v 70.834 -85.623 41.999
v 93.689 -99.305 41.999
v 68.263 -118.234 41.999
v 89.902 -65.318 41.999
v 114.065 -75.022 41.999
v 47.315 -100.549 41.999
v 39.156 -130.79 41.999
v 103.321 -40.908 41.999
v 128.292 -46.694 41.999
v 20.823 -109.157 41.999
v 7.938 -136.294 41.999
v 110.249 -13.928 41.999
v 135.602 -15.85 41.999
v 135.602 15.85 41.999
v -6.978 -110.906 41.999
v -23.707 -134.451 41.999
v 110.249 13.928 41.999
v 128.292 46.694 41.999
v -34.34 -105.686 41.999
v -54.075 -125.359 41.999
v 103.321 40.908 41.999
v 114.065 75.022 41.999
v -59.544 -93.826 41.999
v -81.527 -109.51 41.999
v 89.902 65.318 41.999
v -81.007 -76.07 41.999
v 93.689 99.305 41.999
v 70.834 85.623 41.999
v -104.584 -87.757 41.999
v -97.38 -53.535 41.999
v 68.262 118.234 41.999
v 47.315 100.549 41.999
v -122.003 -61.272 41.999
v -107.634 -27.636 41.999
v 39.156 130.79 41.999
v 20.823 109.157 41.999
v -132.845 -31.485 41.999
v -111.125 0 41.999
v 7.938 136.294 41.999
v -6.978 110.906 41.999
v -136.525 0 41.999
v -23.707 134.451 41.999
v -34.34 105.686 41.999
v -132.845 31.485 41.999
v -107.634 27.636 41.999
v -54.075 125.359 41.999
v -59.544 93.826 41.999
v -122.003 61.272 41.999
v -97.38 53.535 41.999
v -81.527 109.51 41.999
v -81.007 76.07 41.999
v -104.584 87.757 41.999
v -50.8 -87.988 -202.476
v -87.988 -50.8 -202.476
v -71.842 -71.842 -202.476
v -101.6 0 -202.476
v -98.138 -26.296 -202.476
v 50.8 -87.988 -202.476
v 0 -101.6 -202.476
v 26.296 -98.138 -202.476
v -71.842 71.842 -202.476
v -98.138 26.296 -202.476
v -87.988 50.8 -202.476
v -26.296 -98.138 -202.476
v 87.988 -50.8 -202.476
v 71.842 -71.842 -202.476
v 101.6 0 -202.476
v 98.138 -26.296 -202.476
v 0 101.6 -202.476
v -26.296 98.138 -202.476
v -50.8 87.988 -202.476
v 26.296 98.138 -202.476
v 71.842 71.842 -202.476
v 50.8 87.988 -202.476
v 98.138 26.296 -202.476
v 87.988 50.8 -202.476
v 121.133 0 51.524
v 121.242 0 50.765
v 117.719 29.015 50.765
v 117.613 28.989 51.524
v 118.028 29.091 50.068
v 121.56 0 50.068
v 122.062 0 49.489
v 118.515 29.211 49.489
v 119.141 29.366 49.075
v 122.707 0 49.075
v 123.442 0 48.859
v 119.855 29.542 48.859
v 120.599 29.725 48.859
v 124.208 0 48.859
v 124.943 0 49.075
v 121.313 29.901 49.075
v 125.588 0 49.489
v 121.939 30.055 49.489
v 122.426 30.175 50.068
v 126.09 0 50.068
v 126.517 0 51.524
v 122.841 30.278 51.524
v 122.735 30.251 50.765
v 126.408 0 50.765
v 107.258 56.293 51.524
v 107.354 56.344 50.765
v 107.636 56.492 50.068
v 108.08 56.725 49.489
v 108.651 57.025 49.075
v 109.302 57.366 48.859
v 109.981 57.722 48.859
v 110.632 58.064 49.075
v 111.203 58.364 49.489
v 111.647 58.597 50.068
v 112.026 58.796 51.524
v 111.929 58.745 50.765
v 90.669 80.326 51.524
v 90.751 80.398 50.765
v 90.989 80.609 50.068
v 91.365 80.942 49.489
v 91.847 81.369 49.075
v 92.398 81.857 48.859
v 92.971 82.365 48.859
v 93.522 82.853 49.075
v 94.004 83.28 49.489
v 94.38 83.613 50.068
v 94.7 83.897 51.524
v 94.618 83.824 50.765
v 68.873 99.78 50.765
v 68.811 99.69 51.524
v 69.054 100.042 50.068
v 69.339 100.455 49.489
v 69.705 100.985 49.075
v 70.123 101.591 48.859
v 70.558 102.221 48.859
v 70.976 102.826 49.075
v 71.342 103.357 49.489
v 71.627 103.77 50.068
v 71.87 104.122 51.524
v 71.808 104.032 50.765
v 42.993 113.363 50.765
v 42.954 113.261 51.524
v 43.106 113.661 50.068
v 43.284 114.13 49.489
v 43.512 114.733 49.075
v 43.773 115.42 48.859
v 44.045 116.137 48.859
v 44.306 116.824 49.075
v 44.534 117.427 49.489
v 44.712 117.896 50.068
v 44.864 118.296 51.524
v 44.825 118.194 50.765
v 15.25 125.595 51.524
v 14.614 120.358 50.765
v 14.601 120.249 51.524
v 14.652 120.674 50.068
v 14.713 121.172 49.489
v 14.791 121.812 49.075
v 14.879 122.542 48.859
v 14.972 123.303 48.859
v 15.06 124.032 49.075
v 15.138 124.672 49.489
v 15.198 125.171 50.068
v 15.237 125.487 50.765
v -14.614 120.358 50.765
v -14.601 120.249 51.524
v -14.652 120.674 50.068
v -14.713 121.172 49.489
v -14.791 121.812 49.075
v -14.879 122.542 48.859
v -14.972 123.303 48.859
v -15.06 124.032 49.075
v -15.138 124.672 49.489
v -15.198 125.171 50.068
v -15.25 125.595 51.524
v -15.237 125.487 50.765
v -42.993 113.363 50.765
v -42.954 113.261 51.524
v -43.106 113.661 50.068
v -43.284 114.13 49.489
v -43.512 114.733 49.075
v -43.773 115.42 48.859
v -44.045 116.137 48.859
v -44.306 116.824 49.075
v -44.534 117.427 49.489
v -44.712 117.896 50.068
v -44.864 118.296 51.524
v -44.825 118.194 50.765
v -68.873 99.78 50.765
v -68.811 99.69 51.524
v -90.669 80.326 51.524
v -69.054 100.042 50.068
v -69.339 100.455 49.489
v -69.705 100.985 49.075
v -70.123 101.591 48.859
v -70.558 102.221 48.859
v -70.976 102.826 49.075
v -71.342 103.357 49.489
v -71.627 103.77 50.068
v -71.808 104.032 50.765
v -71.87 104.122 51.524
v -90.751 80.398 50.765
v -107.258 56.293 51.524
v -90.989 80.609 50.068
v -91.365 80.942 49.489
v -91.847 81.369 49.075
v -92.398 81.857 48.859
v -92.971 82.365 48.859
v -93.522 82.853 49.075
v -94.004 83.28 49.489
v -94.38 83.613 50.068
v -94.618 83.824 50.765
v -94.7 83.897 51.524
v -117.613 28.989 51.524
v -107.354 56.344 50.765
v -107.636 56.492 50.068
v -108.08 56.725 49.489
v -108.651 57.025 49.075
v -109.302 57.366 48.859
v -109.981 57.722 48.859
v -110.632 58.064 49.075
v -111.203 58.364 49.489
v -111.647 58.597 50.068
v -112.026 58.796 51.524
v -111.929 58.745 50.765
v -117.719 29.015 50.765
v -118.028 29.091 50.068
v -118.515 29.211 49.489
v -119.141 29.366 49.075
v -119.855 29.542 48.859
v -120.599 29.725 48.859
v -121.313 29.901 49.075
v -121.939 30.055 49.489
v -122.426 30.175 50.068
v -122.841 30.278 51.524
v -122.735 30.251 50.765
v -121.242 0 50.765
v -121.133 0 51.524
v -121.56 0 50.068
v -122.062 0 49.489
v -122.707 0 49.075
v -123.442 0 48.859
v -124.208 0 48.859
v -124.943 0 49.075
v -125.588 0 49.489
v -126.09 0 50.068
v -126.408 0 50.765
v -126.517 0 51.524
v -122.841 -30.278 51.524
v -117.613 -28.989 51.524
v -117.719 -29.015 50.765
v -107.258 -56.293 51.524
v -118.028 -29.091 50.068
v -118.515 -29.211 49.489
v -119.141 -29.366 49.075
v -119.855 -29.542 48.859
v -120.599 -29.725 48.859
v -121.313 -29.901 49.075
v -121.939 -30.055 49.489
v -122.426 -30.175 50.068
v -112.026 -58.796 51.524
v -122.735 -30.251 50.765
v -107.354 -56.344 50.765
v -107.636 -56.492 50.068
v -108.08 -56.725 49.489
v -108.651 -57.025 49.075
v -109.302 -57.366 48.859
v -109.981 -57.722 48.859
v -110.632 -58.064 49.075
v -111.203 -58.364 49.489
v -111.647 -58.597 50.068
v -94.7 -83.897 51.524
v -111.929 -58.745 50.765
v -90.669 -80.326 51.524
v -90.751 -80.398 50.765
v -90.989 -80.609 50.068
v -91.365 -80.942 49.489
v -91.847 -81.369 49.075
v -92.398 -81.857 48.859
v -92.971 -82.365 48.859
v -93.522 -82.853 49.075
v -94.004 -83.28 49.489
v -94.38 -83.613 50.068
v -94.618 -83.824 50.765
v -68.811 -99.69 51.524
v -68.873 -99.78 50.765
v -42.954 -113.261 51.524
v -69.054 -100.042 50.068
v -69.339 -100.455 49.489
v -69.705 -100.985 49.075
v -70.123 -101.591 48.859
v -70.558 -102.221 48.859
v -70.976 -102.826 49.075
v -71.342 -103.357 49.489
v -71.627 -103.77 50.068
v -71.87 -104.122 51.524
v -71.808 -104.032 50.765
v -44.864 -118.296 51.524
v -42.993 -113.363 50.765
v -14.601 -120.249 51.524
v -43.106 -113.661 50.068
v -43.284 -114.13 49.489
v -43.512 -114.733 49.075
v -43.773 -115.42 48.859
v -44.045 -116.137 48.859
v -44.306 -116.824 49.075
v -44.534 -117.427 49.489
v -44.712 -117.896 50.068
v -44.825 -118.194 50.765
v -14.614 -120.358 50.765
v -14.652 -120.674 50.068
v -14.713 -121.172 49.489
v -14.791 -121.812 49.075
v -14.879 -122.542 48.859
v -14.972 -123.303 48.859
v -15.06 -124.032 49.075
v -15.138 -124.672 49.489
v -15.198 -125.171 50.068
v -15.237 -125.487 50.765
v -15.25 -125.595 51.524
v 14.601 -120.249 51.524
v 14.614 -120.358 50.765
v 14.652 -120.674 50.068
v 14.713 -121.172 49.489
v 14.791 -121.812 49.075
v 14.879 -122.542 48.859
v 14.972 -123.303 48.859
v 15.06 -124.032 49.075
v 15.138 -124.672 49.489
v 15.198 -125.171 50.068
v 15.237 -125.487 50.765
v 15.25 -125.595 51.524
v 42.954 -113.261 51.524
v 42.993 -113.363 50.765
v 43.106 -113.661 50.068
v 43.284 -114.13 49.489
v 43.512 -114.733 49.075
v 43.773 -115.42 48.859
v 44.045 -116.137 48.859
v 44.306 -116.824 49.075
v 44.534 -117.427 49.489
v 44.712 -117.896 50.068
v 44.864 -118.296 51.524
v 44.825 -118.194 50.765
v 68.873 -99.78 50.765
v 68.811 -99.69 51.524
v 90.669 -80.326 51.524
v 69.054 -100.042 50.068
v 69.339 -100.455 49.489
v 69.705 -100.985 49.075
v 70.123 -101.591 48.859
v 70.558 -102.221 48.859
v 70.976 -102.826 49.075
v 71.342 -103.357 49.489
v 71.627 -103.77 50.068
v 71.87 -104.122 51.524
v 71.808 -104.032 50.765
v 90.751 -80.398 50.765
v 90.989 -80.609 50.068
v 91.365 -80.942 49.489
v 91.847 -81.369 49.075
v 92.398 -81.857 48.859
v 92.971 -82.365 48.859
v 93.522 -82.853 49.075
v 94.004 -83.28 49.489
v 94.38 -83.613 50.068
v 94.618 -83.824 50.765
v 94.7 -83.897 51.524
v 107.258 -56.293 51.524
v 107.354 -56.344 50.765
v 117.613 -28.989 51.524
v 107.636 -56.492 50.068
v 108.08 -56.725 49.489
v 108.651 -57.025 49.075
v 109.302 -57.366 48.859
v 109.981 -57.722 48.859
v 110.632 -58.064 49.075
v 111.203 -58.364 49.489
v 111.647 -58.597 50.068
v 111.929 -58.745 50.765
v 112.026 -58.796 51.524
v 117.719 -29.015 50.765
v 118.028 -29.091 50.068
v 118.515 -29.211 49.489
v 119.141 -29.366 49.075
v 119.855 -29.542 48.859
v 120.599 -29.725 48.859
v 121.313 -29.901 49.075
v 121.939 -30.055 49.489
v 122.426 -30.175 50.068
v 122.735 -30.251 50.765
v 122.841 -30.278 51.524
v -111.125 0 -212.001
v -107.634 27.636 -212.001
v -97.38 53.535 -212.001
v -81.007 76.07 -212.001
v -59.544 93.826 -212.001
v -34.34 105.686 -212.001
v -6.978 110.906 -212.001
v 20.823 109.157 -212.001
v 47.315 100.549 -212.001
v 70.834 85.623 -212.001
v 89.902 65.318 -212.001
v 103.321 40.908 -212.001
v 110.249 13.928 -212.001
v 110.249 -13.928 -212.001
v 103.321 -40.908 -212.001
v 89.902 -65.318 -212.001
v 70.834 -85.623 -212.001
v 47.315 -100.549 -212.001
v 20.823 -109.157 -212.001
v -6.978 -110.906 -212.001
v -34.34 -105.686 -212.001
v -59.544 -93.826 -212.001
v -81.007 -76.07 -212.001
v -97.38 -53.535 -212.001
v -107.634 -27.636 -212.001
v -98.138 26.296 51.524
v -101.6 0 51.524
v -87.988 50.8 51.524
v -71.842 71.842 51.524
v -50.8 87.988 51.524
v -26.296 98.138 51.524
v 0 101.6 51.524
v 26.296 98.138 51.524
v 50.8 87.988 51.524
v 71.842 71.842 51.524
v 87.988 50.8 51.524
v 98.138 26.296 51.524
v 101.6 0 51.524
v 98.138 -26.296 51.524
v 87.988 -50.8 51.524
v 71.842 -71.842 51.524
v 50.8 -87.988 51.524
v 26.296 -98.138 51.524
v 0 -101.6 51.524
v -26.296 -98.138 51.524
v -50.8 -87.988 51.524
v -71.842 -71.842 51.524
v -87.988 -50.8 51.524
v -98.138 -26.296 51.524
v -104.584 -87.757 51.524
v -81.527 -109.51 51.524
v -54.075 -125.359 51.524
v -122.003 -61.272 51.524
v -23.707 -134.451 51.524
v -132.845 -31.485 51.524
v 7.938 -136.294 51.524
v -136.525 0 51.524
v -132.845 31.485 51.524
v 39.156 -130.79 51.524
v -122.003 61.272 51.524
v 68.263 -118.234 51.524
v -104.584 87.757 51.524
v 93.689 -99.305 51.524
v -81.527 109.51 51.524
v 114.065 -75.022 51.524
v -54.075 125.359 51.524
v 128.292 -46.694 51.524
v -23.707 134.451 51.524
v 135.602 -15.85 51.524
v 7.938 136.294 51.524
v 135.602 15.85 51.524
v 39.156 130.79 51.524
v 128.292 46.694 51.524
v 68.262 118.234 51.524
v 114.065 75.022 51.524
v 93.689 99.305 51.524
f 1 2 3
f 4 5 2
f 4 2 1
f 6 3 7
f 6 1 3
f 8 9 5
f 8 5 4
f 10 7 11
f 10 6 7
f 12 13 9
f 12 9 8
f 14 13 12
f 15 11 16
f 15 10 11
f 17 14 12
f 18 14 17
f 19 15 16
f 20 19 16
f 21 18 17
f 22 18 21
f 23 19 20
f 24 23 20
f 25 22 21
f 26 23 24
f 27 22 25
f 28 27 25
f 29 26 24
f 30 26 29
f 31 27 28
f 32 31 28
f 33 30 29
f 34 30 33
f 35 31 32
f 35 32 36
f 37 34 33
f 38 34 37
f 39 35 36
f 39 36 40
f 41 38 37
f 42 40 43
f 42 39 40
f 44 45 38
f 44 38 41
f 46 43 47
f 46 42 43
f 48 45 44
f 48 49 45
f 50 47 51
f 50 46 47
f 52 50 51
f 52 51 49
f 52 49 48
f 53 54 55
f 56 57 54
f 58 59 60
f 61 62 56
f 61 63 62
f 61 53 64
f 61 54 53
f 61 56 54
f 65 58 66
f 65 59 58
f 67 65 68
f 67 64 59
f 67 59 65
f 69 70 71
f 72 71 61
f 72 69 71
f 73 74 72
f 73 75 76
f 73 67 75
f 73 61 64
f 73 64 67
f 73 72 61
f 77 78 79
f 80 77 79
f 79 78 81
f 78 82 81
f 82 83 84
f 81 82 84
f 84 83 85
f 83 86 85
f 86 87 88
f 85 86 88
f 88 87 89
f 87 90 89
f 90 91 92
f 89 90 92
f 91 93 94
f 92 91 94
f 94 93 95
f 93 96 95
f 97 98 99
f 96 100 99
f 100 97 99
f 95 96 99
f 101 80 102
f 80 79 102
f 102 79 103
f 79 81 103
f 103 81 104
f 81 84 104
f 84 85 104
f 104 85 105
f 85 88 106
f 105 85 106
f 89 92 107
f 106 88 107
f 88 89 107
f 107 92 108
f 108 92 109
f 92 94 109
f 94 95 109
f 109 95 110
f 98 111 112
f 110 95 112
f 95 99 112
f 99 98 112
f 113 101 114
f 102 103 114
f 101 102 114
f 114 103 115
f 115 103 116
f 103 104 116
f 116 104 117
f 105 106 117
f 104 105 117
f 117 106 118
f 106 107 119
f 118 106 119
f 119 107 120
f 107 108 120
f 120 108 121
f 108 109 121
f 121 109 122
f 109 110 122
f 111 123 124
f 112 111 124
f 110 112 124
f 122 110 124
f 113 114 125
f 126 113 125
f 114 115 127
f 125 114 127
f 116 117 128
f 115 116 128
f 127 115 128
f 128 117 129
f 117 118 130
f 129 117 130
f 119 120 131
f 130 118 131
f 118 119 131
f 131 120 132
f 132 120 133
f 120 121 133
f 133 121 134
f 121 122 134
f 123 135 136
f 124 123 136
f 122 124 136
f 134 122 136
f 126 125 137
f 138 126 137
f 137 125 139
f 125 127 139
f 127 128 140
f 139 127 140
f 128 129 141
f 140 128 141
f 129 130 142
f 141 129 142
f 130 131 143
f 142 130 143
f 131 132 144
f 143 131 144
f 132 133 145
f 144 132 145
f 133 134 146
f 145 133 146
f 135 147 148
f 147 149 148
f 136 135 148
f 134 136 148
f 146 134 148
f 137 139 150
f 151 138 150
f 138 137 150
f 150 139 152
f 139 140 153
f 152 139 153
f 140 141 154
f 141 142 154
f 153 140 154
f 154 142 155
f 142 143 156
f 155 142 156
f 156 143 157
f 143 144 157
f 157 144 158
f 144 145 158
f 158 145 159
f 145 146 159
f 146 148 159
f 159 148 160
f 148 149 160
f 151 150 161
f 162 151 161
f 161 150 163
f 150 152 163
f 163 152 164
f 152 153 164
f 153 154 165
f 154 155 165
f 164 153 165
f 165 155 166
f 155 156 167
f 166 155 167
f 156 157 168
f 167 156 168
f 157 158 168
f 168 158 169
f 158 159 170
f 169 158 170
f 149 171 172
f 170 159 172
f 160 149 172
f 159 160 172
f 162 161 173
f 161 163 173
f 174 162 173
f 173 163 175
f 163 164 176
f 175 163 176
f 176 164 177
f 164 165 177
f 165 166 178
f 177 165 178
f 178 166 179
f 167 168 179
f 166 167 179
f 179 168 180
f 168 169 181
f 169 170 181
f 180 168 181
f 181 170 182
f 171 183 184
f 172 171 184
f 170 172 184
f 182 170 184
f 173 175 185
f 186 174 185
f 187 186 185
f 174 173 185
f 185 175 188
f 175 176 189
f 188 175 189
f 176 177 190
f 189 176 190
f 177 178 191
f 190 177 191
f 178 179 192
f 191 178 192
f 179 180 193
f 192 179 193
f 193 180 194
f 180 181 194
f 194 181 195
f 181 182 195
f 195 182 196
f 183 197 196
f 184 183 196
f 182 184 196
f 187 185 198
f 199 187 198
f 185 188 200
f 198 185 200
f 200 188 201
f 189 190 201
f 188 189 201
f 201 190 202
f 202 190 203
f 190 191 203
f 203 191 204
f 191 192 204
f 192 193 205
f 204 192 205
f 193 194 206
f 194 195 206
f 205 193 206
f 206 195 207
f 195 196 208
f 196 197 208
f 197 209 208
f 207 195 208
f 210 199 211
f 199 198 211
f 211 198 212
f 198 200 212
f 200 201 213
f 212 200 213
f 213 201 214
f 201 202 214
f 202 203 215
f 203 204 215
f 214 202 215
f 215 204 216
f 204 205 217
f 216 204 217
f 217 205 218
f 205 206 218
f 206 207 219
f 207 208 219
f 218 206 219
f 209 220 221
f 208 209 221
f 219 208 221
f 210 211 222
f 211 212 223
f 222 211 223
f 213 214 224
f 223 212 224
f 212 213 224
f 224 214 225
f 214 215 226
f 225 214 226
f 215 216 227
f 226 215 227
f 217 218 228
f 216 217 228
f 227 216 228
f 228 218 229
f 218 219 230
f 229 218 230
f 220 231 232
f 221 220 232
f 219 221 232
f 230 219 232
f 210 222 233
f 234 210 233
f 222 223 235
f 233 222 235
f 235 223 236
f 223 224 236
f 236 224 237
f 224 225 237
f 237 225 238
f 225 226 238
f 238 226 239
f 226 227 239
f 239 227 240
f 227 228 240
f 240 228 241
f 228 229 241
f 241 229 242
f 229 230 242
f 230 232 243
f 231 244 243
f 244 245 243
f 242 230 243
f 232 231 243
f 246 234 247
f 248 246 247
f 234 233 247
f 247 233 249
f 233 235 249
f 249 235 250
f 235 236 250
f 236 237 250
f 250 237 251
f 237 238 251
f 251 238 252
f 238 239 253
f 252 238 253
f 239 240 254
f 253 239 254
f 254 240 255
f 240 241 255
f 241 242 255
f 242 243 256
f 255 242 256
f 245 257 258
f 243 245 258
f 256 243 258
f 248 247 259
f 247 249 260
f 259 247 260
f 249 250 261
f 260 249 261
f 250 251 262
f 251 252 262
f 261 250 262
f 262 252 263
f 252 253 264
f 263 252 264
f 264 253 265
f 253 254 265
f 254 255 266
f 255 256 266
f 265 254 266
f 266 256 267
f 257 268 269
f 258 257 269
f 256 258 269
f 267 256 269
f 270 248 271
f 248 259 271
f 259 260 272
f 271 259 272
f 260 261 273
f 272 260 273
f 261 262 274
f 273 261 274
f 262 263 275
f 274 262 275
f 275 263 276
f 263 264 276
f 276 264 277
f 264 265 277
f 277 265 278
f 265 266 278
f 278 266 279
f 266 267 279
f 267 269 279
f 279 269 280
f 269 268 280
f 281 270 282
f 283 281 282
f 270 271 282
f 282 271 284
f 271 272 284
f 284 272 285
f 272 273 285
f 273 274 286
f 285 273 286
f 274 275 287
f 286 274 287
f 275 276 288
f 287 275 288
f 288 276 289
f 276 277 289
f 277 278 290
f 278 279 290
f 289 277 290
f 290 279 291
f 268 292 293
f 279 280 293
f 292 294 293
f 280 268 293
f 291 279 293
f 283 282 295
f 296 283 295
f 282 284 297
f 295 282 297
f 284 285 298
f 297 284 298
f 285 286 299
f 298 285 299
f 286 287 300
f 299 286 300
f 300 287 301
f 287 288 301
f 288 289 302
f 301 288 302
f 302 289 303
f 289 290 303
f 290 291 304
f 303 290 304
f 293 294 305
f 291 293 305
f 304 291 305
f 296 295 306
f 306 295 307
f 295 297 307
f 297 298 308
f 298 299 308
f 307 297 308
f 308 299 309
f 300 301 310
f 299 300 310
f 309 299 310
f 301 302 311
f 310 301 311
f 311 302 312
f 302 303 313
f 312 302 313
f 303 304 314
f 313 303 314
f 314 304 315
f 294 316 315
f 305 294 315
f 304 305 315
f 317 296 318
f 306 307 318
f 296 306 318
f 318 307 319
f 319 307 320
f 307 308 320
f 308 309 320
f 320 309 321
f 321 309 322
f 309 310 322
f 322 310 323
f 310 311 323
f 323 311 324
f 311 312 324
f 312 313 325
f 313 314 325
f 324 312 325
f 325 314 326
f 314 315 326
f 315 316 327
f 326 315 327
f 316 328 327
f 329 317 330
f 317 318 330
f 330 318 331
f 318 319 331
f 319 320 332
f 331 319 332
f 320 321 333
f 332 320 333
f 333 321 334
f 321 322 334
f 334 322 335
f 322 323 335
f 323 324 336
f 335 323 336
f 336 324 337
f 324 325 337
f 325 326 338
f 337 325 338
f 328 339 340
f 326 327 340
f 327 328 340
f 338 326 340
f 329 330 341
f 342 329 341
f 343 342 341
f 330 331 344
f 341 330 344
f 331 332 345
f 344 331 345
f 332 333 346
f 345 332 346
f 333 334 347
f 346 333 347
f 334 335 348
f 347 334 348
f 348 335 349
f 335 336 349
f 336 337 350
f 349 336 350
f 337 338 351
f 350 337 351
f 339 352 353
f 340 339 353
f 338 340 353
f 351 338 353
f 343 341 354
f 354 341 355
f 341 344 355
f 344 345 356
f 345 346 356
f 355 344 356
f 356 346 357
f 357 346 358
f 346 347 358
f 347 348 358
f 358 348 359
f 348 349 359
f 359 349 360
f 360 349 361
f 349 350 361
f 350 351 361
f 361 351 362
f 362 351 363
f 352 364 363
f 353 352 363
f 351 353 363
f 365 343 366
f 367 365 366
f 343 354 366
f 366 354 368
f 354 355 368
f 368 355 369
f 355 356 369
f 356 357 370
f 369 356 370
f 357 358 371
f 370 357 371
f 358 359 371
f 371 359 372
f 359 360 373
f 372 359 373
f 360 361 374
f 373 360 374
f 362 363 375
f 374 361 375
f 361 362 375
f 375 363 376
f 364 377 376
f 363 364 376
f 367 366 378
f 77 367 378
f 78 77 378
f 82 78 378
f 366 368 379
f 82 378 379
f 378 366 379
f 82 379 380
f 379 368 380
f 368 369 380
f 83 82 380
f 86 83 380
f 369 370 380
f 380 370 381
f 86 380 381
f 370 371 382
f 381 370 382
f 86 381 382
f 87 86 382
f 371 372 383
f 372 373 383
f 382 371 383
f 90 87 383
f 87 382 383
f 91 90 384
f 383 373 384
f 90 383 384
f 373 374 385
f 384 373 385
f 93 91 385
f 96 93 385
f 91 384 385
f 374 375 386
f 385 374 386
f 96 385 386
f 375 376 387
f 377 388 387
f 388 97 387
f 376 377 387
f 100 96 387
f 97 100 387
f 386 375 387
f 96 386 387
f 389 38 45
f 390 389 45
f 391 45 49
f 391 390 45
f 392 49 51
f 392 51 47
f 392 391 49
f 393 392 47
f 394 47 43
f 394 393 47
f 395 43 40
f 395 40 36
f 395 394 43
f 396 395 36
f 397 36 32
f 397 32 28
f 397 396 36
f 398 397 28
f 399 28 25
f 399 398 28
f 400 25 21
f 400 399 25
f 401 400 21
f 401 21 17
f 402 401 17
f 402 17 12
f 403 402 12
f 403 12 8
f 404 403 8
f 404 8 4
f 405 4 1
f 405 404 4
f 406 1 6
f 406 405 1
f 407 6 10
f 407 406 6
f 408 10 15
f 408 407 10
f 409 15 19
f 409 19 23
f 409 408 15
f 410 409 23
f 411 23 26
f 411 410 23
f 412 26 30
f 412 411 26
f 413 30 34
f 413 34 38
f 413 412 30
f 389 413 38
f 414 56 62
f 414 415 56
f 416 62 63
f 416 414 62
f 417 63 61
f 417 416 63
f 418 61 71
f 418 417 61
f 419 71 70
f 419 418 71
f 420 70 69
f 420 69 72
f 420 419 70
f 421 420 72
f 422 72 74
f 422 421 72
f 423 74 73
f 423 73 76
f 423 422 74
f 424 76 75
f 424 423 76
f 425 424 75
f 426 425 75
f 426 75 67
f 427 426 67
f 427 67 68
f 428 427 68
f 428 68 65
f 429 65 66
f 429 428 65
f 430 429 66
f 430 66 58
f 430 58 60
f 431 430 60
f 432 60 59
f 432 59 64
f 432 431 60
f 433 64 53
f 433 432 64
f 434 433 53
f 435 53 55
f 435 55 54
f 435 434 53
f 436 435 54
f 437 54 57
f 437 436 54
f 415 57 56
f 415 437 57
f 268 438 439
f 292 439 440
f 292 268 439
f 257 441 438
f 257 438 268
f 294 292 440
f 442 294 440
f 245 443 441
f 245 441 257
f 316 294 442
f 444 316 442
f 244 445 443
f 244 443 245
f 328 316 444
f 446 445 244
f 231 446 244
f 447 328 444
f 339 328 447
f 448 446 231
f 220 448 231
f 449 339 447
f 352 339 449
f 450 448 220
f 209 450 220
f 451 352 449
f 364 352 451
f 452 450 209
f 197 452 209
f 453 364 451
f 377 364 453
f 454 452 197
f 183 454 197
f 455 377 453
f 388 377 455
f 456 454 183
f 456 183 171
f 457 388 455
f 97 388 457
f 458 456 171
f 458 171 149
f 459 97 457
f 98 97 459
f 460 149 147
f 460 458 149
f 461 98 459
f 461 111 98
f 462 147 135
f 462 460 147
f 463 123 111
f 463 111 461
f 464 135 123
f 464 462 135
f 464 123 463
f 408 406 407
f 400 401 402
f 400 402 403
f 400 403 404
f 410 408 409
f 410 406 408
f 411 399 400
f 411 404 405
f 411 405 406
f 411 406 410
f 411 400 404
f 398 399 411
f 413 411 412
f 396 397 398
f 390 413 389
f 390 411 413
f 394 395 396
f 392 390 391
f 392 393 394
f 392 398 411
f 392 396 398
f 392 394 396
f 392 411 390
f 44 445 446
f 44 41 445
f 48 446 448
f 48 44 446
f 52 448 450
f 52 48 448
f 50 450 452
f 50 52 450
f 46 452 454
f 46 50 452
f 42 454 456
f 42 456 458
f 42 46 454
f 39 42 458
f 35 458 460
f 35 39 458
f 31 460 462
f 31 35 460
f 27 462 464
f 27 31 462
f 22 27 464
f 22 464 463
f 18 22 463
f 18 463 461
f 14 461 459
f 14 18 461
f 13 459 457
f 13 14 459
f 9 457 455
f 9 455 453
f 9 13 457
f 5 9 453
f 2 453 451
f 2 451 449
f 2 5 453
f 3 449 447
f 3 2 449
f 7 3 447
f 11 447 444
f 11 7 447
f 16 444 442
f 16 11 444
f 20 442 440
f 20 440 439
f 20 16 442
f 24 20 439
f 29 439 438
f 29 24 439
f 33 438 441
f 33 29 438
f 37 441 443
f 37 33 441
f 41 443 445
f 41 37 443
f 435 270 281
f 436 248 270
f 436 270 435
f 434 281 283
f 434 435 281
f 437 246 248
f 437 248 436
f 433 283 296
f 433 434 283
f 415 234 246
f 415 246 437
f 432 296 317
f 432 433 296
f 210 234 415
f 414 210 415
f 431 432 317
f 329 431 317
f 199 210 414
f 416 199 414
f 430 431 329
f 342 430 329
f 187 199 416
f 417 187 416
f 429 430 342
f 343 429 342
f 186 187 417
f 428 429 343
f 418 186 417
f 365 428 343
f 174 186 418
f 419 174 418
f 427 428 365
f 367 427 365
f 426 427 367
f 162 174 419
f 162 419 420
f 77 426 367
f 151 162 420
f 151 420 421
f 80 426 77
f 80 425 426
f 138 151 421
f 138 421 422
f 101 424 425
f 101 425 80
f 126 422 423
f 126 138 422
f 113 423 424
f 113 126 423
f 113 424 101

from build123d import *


with BuildPart() as f1:
    # F0 (on Front) → F1 (revolve)
    with BuildSketch(Plane.XZ):
        Polygon((0, -212.00102), (0, -202.47602), (-101.6, -202.47602), (-101.6, 51.52398), (-136.525, 51.52398), (-136.525, 41.99898), (-111.125, 41.99898), (-111.125, -212.00102), align=None)
    revolve(axis=Axis((0, 0, -78.97687), (0, 0, -1)))

    # F4: sweep along a path in F2
    with BuildLine(Plane.XY.offset(51.52398)) as f4_path:
        CenterArc((0, 0), 123.825, 0, 360)
    # F3 (on Front) → F4 (sweep, cut)
    with BuildSketch(Plane.XZ):
        with BuildLine():
            Line((-121.1326, 51.52398), (-126.5174, 51.52398))
            ThreePointArc((-126.5174, 51.52398), (-123.825, 48.83158), (-121.1326, 51.52398))
        make_face()
    sweep(path=f4_path.line, mode=Mode.SUBTRACT)


solid = f1.part
